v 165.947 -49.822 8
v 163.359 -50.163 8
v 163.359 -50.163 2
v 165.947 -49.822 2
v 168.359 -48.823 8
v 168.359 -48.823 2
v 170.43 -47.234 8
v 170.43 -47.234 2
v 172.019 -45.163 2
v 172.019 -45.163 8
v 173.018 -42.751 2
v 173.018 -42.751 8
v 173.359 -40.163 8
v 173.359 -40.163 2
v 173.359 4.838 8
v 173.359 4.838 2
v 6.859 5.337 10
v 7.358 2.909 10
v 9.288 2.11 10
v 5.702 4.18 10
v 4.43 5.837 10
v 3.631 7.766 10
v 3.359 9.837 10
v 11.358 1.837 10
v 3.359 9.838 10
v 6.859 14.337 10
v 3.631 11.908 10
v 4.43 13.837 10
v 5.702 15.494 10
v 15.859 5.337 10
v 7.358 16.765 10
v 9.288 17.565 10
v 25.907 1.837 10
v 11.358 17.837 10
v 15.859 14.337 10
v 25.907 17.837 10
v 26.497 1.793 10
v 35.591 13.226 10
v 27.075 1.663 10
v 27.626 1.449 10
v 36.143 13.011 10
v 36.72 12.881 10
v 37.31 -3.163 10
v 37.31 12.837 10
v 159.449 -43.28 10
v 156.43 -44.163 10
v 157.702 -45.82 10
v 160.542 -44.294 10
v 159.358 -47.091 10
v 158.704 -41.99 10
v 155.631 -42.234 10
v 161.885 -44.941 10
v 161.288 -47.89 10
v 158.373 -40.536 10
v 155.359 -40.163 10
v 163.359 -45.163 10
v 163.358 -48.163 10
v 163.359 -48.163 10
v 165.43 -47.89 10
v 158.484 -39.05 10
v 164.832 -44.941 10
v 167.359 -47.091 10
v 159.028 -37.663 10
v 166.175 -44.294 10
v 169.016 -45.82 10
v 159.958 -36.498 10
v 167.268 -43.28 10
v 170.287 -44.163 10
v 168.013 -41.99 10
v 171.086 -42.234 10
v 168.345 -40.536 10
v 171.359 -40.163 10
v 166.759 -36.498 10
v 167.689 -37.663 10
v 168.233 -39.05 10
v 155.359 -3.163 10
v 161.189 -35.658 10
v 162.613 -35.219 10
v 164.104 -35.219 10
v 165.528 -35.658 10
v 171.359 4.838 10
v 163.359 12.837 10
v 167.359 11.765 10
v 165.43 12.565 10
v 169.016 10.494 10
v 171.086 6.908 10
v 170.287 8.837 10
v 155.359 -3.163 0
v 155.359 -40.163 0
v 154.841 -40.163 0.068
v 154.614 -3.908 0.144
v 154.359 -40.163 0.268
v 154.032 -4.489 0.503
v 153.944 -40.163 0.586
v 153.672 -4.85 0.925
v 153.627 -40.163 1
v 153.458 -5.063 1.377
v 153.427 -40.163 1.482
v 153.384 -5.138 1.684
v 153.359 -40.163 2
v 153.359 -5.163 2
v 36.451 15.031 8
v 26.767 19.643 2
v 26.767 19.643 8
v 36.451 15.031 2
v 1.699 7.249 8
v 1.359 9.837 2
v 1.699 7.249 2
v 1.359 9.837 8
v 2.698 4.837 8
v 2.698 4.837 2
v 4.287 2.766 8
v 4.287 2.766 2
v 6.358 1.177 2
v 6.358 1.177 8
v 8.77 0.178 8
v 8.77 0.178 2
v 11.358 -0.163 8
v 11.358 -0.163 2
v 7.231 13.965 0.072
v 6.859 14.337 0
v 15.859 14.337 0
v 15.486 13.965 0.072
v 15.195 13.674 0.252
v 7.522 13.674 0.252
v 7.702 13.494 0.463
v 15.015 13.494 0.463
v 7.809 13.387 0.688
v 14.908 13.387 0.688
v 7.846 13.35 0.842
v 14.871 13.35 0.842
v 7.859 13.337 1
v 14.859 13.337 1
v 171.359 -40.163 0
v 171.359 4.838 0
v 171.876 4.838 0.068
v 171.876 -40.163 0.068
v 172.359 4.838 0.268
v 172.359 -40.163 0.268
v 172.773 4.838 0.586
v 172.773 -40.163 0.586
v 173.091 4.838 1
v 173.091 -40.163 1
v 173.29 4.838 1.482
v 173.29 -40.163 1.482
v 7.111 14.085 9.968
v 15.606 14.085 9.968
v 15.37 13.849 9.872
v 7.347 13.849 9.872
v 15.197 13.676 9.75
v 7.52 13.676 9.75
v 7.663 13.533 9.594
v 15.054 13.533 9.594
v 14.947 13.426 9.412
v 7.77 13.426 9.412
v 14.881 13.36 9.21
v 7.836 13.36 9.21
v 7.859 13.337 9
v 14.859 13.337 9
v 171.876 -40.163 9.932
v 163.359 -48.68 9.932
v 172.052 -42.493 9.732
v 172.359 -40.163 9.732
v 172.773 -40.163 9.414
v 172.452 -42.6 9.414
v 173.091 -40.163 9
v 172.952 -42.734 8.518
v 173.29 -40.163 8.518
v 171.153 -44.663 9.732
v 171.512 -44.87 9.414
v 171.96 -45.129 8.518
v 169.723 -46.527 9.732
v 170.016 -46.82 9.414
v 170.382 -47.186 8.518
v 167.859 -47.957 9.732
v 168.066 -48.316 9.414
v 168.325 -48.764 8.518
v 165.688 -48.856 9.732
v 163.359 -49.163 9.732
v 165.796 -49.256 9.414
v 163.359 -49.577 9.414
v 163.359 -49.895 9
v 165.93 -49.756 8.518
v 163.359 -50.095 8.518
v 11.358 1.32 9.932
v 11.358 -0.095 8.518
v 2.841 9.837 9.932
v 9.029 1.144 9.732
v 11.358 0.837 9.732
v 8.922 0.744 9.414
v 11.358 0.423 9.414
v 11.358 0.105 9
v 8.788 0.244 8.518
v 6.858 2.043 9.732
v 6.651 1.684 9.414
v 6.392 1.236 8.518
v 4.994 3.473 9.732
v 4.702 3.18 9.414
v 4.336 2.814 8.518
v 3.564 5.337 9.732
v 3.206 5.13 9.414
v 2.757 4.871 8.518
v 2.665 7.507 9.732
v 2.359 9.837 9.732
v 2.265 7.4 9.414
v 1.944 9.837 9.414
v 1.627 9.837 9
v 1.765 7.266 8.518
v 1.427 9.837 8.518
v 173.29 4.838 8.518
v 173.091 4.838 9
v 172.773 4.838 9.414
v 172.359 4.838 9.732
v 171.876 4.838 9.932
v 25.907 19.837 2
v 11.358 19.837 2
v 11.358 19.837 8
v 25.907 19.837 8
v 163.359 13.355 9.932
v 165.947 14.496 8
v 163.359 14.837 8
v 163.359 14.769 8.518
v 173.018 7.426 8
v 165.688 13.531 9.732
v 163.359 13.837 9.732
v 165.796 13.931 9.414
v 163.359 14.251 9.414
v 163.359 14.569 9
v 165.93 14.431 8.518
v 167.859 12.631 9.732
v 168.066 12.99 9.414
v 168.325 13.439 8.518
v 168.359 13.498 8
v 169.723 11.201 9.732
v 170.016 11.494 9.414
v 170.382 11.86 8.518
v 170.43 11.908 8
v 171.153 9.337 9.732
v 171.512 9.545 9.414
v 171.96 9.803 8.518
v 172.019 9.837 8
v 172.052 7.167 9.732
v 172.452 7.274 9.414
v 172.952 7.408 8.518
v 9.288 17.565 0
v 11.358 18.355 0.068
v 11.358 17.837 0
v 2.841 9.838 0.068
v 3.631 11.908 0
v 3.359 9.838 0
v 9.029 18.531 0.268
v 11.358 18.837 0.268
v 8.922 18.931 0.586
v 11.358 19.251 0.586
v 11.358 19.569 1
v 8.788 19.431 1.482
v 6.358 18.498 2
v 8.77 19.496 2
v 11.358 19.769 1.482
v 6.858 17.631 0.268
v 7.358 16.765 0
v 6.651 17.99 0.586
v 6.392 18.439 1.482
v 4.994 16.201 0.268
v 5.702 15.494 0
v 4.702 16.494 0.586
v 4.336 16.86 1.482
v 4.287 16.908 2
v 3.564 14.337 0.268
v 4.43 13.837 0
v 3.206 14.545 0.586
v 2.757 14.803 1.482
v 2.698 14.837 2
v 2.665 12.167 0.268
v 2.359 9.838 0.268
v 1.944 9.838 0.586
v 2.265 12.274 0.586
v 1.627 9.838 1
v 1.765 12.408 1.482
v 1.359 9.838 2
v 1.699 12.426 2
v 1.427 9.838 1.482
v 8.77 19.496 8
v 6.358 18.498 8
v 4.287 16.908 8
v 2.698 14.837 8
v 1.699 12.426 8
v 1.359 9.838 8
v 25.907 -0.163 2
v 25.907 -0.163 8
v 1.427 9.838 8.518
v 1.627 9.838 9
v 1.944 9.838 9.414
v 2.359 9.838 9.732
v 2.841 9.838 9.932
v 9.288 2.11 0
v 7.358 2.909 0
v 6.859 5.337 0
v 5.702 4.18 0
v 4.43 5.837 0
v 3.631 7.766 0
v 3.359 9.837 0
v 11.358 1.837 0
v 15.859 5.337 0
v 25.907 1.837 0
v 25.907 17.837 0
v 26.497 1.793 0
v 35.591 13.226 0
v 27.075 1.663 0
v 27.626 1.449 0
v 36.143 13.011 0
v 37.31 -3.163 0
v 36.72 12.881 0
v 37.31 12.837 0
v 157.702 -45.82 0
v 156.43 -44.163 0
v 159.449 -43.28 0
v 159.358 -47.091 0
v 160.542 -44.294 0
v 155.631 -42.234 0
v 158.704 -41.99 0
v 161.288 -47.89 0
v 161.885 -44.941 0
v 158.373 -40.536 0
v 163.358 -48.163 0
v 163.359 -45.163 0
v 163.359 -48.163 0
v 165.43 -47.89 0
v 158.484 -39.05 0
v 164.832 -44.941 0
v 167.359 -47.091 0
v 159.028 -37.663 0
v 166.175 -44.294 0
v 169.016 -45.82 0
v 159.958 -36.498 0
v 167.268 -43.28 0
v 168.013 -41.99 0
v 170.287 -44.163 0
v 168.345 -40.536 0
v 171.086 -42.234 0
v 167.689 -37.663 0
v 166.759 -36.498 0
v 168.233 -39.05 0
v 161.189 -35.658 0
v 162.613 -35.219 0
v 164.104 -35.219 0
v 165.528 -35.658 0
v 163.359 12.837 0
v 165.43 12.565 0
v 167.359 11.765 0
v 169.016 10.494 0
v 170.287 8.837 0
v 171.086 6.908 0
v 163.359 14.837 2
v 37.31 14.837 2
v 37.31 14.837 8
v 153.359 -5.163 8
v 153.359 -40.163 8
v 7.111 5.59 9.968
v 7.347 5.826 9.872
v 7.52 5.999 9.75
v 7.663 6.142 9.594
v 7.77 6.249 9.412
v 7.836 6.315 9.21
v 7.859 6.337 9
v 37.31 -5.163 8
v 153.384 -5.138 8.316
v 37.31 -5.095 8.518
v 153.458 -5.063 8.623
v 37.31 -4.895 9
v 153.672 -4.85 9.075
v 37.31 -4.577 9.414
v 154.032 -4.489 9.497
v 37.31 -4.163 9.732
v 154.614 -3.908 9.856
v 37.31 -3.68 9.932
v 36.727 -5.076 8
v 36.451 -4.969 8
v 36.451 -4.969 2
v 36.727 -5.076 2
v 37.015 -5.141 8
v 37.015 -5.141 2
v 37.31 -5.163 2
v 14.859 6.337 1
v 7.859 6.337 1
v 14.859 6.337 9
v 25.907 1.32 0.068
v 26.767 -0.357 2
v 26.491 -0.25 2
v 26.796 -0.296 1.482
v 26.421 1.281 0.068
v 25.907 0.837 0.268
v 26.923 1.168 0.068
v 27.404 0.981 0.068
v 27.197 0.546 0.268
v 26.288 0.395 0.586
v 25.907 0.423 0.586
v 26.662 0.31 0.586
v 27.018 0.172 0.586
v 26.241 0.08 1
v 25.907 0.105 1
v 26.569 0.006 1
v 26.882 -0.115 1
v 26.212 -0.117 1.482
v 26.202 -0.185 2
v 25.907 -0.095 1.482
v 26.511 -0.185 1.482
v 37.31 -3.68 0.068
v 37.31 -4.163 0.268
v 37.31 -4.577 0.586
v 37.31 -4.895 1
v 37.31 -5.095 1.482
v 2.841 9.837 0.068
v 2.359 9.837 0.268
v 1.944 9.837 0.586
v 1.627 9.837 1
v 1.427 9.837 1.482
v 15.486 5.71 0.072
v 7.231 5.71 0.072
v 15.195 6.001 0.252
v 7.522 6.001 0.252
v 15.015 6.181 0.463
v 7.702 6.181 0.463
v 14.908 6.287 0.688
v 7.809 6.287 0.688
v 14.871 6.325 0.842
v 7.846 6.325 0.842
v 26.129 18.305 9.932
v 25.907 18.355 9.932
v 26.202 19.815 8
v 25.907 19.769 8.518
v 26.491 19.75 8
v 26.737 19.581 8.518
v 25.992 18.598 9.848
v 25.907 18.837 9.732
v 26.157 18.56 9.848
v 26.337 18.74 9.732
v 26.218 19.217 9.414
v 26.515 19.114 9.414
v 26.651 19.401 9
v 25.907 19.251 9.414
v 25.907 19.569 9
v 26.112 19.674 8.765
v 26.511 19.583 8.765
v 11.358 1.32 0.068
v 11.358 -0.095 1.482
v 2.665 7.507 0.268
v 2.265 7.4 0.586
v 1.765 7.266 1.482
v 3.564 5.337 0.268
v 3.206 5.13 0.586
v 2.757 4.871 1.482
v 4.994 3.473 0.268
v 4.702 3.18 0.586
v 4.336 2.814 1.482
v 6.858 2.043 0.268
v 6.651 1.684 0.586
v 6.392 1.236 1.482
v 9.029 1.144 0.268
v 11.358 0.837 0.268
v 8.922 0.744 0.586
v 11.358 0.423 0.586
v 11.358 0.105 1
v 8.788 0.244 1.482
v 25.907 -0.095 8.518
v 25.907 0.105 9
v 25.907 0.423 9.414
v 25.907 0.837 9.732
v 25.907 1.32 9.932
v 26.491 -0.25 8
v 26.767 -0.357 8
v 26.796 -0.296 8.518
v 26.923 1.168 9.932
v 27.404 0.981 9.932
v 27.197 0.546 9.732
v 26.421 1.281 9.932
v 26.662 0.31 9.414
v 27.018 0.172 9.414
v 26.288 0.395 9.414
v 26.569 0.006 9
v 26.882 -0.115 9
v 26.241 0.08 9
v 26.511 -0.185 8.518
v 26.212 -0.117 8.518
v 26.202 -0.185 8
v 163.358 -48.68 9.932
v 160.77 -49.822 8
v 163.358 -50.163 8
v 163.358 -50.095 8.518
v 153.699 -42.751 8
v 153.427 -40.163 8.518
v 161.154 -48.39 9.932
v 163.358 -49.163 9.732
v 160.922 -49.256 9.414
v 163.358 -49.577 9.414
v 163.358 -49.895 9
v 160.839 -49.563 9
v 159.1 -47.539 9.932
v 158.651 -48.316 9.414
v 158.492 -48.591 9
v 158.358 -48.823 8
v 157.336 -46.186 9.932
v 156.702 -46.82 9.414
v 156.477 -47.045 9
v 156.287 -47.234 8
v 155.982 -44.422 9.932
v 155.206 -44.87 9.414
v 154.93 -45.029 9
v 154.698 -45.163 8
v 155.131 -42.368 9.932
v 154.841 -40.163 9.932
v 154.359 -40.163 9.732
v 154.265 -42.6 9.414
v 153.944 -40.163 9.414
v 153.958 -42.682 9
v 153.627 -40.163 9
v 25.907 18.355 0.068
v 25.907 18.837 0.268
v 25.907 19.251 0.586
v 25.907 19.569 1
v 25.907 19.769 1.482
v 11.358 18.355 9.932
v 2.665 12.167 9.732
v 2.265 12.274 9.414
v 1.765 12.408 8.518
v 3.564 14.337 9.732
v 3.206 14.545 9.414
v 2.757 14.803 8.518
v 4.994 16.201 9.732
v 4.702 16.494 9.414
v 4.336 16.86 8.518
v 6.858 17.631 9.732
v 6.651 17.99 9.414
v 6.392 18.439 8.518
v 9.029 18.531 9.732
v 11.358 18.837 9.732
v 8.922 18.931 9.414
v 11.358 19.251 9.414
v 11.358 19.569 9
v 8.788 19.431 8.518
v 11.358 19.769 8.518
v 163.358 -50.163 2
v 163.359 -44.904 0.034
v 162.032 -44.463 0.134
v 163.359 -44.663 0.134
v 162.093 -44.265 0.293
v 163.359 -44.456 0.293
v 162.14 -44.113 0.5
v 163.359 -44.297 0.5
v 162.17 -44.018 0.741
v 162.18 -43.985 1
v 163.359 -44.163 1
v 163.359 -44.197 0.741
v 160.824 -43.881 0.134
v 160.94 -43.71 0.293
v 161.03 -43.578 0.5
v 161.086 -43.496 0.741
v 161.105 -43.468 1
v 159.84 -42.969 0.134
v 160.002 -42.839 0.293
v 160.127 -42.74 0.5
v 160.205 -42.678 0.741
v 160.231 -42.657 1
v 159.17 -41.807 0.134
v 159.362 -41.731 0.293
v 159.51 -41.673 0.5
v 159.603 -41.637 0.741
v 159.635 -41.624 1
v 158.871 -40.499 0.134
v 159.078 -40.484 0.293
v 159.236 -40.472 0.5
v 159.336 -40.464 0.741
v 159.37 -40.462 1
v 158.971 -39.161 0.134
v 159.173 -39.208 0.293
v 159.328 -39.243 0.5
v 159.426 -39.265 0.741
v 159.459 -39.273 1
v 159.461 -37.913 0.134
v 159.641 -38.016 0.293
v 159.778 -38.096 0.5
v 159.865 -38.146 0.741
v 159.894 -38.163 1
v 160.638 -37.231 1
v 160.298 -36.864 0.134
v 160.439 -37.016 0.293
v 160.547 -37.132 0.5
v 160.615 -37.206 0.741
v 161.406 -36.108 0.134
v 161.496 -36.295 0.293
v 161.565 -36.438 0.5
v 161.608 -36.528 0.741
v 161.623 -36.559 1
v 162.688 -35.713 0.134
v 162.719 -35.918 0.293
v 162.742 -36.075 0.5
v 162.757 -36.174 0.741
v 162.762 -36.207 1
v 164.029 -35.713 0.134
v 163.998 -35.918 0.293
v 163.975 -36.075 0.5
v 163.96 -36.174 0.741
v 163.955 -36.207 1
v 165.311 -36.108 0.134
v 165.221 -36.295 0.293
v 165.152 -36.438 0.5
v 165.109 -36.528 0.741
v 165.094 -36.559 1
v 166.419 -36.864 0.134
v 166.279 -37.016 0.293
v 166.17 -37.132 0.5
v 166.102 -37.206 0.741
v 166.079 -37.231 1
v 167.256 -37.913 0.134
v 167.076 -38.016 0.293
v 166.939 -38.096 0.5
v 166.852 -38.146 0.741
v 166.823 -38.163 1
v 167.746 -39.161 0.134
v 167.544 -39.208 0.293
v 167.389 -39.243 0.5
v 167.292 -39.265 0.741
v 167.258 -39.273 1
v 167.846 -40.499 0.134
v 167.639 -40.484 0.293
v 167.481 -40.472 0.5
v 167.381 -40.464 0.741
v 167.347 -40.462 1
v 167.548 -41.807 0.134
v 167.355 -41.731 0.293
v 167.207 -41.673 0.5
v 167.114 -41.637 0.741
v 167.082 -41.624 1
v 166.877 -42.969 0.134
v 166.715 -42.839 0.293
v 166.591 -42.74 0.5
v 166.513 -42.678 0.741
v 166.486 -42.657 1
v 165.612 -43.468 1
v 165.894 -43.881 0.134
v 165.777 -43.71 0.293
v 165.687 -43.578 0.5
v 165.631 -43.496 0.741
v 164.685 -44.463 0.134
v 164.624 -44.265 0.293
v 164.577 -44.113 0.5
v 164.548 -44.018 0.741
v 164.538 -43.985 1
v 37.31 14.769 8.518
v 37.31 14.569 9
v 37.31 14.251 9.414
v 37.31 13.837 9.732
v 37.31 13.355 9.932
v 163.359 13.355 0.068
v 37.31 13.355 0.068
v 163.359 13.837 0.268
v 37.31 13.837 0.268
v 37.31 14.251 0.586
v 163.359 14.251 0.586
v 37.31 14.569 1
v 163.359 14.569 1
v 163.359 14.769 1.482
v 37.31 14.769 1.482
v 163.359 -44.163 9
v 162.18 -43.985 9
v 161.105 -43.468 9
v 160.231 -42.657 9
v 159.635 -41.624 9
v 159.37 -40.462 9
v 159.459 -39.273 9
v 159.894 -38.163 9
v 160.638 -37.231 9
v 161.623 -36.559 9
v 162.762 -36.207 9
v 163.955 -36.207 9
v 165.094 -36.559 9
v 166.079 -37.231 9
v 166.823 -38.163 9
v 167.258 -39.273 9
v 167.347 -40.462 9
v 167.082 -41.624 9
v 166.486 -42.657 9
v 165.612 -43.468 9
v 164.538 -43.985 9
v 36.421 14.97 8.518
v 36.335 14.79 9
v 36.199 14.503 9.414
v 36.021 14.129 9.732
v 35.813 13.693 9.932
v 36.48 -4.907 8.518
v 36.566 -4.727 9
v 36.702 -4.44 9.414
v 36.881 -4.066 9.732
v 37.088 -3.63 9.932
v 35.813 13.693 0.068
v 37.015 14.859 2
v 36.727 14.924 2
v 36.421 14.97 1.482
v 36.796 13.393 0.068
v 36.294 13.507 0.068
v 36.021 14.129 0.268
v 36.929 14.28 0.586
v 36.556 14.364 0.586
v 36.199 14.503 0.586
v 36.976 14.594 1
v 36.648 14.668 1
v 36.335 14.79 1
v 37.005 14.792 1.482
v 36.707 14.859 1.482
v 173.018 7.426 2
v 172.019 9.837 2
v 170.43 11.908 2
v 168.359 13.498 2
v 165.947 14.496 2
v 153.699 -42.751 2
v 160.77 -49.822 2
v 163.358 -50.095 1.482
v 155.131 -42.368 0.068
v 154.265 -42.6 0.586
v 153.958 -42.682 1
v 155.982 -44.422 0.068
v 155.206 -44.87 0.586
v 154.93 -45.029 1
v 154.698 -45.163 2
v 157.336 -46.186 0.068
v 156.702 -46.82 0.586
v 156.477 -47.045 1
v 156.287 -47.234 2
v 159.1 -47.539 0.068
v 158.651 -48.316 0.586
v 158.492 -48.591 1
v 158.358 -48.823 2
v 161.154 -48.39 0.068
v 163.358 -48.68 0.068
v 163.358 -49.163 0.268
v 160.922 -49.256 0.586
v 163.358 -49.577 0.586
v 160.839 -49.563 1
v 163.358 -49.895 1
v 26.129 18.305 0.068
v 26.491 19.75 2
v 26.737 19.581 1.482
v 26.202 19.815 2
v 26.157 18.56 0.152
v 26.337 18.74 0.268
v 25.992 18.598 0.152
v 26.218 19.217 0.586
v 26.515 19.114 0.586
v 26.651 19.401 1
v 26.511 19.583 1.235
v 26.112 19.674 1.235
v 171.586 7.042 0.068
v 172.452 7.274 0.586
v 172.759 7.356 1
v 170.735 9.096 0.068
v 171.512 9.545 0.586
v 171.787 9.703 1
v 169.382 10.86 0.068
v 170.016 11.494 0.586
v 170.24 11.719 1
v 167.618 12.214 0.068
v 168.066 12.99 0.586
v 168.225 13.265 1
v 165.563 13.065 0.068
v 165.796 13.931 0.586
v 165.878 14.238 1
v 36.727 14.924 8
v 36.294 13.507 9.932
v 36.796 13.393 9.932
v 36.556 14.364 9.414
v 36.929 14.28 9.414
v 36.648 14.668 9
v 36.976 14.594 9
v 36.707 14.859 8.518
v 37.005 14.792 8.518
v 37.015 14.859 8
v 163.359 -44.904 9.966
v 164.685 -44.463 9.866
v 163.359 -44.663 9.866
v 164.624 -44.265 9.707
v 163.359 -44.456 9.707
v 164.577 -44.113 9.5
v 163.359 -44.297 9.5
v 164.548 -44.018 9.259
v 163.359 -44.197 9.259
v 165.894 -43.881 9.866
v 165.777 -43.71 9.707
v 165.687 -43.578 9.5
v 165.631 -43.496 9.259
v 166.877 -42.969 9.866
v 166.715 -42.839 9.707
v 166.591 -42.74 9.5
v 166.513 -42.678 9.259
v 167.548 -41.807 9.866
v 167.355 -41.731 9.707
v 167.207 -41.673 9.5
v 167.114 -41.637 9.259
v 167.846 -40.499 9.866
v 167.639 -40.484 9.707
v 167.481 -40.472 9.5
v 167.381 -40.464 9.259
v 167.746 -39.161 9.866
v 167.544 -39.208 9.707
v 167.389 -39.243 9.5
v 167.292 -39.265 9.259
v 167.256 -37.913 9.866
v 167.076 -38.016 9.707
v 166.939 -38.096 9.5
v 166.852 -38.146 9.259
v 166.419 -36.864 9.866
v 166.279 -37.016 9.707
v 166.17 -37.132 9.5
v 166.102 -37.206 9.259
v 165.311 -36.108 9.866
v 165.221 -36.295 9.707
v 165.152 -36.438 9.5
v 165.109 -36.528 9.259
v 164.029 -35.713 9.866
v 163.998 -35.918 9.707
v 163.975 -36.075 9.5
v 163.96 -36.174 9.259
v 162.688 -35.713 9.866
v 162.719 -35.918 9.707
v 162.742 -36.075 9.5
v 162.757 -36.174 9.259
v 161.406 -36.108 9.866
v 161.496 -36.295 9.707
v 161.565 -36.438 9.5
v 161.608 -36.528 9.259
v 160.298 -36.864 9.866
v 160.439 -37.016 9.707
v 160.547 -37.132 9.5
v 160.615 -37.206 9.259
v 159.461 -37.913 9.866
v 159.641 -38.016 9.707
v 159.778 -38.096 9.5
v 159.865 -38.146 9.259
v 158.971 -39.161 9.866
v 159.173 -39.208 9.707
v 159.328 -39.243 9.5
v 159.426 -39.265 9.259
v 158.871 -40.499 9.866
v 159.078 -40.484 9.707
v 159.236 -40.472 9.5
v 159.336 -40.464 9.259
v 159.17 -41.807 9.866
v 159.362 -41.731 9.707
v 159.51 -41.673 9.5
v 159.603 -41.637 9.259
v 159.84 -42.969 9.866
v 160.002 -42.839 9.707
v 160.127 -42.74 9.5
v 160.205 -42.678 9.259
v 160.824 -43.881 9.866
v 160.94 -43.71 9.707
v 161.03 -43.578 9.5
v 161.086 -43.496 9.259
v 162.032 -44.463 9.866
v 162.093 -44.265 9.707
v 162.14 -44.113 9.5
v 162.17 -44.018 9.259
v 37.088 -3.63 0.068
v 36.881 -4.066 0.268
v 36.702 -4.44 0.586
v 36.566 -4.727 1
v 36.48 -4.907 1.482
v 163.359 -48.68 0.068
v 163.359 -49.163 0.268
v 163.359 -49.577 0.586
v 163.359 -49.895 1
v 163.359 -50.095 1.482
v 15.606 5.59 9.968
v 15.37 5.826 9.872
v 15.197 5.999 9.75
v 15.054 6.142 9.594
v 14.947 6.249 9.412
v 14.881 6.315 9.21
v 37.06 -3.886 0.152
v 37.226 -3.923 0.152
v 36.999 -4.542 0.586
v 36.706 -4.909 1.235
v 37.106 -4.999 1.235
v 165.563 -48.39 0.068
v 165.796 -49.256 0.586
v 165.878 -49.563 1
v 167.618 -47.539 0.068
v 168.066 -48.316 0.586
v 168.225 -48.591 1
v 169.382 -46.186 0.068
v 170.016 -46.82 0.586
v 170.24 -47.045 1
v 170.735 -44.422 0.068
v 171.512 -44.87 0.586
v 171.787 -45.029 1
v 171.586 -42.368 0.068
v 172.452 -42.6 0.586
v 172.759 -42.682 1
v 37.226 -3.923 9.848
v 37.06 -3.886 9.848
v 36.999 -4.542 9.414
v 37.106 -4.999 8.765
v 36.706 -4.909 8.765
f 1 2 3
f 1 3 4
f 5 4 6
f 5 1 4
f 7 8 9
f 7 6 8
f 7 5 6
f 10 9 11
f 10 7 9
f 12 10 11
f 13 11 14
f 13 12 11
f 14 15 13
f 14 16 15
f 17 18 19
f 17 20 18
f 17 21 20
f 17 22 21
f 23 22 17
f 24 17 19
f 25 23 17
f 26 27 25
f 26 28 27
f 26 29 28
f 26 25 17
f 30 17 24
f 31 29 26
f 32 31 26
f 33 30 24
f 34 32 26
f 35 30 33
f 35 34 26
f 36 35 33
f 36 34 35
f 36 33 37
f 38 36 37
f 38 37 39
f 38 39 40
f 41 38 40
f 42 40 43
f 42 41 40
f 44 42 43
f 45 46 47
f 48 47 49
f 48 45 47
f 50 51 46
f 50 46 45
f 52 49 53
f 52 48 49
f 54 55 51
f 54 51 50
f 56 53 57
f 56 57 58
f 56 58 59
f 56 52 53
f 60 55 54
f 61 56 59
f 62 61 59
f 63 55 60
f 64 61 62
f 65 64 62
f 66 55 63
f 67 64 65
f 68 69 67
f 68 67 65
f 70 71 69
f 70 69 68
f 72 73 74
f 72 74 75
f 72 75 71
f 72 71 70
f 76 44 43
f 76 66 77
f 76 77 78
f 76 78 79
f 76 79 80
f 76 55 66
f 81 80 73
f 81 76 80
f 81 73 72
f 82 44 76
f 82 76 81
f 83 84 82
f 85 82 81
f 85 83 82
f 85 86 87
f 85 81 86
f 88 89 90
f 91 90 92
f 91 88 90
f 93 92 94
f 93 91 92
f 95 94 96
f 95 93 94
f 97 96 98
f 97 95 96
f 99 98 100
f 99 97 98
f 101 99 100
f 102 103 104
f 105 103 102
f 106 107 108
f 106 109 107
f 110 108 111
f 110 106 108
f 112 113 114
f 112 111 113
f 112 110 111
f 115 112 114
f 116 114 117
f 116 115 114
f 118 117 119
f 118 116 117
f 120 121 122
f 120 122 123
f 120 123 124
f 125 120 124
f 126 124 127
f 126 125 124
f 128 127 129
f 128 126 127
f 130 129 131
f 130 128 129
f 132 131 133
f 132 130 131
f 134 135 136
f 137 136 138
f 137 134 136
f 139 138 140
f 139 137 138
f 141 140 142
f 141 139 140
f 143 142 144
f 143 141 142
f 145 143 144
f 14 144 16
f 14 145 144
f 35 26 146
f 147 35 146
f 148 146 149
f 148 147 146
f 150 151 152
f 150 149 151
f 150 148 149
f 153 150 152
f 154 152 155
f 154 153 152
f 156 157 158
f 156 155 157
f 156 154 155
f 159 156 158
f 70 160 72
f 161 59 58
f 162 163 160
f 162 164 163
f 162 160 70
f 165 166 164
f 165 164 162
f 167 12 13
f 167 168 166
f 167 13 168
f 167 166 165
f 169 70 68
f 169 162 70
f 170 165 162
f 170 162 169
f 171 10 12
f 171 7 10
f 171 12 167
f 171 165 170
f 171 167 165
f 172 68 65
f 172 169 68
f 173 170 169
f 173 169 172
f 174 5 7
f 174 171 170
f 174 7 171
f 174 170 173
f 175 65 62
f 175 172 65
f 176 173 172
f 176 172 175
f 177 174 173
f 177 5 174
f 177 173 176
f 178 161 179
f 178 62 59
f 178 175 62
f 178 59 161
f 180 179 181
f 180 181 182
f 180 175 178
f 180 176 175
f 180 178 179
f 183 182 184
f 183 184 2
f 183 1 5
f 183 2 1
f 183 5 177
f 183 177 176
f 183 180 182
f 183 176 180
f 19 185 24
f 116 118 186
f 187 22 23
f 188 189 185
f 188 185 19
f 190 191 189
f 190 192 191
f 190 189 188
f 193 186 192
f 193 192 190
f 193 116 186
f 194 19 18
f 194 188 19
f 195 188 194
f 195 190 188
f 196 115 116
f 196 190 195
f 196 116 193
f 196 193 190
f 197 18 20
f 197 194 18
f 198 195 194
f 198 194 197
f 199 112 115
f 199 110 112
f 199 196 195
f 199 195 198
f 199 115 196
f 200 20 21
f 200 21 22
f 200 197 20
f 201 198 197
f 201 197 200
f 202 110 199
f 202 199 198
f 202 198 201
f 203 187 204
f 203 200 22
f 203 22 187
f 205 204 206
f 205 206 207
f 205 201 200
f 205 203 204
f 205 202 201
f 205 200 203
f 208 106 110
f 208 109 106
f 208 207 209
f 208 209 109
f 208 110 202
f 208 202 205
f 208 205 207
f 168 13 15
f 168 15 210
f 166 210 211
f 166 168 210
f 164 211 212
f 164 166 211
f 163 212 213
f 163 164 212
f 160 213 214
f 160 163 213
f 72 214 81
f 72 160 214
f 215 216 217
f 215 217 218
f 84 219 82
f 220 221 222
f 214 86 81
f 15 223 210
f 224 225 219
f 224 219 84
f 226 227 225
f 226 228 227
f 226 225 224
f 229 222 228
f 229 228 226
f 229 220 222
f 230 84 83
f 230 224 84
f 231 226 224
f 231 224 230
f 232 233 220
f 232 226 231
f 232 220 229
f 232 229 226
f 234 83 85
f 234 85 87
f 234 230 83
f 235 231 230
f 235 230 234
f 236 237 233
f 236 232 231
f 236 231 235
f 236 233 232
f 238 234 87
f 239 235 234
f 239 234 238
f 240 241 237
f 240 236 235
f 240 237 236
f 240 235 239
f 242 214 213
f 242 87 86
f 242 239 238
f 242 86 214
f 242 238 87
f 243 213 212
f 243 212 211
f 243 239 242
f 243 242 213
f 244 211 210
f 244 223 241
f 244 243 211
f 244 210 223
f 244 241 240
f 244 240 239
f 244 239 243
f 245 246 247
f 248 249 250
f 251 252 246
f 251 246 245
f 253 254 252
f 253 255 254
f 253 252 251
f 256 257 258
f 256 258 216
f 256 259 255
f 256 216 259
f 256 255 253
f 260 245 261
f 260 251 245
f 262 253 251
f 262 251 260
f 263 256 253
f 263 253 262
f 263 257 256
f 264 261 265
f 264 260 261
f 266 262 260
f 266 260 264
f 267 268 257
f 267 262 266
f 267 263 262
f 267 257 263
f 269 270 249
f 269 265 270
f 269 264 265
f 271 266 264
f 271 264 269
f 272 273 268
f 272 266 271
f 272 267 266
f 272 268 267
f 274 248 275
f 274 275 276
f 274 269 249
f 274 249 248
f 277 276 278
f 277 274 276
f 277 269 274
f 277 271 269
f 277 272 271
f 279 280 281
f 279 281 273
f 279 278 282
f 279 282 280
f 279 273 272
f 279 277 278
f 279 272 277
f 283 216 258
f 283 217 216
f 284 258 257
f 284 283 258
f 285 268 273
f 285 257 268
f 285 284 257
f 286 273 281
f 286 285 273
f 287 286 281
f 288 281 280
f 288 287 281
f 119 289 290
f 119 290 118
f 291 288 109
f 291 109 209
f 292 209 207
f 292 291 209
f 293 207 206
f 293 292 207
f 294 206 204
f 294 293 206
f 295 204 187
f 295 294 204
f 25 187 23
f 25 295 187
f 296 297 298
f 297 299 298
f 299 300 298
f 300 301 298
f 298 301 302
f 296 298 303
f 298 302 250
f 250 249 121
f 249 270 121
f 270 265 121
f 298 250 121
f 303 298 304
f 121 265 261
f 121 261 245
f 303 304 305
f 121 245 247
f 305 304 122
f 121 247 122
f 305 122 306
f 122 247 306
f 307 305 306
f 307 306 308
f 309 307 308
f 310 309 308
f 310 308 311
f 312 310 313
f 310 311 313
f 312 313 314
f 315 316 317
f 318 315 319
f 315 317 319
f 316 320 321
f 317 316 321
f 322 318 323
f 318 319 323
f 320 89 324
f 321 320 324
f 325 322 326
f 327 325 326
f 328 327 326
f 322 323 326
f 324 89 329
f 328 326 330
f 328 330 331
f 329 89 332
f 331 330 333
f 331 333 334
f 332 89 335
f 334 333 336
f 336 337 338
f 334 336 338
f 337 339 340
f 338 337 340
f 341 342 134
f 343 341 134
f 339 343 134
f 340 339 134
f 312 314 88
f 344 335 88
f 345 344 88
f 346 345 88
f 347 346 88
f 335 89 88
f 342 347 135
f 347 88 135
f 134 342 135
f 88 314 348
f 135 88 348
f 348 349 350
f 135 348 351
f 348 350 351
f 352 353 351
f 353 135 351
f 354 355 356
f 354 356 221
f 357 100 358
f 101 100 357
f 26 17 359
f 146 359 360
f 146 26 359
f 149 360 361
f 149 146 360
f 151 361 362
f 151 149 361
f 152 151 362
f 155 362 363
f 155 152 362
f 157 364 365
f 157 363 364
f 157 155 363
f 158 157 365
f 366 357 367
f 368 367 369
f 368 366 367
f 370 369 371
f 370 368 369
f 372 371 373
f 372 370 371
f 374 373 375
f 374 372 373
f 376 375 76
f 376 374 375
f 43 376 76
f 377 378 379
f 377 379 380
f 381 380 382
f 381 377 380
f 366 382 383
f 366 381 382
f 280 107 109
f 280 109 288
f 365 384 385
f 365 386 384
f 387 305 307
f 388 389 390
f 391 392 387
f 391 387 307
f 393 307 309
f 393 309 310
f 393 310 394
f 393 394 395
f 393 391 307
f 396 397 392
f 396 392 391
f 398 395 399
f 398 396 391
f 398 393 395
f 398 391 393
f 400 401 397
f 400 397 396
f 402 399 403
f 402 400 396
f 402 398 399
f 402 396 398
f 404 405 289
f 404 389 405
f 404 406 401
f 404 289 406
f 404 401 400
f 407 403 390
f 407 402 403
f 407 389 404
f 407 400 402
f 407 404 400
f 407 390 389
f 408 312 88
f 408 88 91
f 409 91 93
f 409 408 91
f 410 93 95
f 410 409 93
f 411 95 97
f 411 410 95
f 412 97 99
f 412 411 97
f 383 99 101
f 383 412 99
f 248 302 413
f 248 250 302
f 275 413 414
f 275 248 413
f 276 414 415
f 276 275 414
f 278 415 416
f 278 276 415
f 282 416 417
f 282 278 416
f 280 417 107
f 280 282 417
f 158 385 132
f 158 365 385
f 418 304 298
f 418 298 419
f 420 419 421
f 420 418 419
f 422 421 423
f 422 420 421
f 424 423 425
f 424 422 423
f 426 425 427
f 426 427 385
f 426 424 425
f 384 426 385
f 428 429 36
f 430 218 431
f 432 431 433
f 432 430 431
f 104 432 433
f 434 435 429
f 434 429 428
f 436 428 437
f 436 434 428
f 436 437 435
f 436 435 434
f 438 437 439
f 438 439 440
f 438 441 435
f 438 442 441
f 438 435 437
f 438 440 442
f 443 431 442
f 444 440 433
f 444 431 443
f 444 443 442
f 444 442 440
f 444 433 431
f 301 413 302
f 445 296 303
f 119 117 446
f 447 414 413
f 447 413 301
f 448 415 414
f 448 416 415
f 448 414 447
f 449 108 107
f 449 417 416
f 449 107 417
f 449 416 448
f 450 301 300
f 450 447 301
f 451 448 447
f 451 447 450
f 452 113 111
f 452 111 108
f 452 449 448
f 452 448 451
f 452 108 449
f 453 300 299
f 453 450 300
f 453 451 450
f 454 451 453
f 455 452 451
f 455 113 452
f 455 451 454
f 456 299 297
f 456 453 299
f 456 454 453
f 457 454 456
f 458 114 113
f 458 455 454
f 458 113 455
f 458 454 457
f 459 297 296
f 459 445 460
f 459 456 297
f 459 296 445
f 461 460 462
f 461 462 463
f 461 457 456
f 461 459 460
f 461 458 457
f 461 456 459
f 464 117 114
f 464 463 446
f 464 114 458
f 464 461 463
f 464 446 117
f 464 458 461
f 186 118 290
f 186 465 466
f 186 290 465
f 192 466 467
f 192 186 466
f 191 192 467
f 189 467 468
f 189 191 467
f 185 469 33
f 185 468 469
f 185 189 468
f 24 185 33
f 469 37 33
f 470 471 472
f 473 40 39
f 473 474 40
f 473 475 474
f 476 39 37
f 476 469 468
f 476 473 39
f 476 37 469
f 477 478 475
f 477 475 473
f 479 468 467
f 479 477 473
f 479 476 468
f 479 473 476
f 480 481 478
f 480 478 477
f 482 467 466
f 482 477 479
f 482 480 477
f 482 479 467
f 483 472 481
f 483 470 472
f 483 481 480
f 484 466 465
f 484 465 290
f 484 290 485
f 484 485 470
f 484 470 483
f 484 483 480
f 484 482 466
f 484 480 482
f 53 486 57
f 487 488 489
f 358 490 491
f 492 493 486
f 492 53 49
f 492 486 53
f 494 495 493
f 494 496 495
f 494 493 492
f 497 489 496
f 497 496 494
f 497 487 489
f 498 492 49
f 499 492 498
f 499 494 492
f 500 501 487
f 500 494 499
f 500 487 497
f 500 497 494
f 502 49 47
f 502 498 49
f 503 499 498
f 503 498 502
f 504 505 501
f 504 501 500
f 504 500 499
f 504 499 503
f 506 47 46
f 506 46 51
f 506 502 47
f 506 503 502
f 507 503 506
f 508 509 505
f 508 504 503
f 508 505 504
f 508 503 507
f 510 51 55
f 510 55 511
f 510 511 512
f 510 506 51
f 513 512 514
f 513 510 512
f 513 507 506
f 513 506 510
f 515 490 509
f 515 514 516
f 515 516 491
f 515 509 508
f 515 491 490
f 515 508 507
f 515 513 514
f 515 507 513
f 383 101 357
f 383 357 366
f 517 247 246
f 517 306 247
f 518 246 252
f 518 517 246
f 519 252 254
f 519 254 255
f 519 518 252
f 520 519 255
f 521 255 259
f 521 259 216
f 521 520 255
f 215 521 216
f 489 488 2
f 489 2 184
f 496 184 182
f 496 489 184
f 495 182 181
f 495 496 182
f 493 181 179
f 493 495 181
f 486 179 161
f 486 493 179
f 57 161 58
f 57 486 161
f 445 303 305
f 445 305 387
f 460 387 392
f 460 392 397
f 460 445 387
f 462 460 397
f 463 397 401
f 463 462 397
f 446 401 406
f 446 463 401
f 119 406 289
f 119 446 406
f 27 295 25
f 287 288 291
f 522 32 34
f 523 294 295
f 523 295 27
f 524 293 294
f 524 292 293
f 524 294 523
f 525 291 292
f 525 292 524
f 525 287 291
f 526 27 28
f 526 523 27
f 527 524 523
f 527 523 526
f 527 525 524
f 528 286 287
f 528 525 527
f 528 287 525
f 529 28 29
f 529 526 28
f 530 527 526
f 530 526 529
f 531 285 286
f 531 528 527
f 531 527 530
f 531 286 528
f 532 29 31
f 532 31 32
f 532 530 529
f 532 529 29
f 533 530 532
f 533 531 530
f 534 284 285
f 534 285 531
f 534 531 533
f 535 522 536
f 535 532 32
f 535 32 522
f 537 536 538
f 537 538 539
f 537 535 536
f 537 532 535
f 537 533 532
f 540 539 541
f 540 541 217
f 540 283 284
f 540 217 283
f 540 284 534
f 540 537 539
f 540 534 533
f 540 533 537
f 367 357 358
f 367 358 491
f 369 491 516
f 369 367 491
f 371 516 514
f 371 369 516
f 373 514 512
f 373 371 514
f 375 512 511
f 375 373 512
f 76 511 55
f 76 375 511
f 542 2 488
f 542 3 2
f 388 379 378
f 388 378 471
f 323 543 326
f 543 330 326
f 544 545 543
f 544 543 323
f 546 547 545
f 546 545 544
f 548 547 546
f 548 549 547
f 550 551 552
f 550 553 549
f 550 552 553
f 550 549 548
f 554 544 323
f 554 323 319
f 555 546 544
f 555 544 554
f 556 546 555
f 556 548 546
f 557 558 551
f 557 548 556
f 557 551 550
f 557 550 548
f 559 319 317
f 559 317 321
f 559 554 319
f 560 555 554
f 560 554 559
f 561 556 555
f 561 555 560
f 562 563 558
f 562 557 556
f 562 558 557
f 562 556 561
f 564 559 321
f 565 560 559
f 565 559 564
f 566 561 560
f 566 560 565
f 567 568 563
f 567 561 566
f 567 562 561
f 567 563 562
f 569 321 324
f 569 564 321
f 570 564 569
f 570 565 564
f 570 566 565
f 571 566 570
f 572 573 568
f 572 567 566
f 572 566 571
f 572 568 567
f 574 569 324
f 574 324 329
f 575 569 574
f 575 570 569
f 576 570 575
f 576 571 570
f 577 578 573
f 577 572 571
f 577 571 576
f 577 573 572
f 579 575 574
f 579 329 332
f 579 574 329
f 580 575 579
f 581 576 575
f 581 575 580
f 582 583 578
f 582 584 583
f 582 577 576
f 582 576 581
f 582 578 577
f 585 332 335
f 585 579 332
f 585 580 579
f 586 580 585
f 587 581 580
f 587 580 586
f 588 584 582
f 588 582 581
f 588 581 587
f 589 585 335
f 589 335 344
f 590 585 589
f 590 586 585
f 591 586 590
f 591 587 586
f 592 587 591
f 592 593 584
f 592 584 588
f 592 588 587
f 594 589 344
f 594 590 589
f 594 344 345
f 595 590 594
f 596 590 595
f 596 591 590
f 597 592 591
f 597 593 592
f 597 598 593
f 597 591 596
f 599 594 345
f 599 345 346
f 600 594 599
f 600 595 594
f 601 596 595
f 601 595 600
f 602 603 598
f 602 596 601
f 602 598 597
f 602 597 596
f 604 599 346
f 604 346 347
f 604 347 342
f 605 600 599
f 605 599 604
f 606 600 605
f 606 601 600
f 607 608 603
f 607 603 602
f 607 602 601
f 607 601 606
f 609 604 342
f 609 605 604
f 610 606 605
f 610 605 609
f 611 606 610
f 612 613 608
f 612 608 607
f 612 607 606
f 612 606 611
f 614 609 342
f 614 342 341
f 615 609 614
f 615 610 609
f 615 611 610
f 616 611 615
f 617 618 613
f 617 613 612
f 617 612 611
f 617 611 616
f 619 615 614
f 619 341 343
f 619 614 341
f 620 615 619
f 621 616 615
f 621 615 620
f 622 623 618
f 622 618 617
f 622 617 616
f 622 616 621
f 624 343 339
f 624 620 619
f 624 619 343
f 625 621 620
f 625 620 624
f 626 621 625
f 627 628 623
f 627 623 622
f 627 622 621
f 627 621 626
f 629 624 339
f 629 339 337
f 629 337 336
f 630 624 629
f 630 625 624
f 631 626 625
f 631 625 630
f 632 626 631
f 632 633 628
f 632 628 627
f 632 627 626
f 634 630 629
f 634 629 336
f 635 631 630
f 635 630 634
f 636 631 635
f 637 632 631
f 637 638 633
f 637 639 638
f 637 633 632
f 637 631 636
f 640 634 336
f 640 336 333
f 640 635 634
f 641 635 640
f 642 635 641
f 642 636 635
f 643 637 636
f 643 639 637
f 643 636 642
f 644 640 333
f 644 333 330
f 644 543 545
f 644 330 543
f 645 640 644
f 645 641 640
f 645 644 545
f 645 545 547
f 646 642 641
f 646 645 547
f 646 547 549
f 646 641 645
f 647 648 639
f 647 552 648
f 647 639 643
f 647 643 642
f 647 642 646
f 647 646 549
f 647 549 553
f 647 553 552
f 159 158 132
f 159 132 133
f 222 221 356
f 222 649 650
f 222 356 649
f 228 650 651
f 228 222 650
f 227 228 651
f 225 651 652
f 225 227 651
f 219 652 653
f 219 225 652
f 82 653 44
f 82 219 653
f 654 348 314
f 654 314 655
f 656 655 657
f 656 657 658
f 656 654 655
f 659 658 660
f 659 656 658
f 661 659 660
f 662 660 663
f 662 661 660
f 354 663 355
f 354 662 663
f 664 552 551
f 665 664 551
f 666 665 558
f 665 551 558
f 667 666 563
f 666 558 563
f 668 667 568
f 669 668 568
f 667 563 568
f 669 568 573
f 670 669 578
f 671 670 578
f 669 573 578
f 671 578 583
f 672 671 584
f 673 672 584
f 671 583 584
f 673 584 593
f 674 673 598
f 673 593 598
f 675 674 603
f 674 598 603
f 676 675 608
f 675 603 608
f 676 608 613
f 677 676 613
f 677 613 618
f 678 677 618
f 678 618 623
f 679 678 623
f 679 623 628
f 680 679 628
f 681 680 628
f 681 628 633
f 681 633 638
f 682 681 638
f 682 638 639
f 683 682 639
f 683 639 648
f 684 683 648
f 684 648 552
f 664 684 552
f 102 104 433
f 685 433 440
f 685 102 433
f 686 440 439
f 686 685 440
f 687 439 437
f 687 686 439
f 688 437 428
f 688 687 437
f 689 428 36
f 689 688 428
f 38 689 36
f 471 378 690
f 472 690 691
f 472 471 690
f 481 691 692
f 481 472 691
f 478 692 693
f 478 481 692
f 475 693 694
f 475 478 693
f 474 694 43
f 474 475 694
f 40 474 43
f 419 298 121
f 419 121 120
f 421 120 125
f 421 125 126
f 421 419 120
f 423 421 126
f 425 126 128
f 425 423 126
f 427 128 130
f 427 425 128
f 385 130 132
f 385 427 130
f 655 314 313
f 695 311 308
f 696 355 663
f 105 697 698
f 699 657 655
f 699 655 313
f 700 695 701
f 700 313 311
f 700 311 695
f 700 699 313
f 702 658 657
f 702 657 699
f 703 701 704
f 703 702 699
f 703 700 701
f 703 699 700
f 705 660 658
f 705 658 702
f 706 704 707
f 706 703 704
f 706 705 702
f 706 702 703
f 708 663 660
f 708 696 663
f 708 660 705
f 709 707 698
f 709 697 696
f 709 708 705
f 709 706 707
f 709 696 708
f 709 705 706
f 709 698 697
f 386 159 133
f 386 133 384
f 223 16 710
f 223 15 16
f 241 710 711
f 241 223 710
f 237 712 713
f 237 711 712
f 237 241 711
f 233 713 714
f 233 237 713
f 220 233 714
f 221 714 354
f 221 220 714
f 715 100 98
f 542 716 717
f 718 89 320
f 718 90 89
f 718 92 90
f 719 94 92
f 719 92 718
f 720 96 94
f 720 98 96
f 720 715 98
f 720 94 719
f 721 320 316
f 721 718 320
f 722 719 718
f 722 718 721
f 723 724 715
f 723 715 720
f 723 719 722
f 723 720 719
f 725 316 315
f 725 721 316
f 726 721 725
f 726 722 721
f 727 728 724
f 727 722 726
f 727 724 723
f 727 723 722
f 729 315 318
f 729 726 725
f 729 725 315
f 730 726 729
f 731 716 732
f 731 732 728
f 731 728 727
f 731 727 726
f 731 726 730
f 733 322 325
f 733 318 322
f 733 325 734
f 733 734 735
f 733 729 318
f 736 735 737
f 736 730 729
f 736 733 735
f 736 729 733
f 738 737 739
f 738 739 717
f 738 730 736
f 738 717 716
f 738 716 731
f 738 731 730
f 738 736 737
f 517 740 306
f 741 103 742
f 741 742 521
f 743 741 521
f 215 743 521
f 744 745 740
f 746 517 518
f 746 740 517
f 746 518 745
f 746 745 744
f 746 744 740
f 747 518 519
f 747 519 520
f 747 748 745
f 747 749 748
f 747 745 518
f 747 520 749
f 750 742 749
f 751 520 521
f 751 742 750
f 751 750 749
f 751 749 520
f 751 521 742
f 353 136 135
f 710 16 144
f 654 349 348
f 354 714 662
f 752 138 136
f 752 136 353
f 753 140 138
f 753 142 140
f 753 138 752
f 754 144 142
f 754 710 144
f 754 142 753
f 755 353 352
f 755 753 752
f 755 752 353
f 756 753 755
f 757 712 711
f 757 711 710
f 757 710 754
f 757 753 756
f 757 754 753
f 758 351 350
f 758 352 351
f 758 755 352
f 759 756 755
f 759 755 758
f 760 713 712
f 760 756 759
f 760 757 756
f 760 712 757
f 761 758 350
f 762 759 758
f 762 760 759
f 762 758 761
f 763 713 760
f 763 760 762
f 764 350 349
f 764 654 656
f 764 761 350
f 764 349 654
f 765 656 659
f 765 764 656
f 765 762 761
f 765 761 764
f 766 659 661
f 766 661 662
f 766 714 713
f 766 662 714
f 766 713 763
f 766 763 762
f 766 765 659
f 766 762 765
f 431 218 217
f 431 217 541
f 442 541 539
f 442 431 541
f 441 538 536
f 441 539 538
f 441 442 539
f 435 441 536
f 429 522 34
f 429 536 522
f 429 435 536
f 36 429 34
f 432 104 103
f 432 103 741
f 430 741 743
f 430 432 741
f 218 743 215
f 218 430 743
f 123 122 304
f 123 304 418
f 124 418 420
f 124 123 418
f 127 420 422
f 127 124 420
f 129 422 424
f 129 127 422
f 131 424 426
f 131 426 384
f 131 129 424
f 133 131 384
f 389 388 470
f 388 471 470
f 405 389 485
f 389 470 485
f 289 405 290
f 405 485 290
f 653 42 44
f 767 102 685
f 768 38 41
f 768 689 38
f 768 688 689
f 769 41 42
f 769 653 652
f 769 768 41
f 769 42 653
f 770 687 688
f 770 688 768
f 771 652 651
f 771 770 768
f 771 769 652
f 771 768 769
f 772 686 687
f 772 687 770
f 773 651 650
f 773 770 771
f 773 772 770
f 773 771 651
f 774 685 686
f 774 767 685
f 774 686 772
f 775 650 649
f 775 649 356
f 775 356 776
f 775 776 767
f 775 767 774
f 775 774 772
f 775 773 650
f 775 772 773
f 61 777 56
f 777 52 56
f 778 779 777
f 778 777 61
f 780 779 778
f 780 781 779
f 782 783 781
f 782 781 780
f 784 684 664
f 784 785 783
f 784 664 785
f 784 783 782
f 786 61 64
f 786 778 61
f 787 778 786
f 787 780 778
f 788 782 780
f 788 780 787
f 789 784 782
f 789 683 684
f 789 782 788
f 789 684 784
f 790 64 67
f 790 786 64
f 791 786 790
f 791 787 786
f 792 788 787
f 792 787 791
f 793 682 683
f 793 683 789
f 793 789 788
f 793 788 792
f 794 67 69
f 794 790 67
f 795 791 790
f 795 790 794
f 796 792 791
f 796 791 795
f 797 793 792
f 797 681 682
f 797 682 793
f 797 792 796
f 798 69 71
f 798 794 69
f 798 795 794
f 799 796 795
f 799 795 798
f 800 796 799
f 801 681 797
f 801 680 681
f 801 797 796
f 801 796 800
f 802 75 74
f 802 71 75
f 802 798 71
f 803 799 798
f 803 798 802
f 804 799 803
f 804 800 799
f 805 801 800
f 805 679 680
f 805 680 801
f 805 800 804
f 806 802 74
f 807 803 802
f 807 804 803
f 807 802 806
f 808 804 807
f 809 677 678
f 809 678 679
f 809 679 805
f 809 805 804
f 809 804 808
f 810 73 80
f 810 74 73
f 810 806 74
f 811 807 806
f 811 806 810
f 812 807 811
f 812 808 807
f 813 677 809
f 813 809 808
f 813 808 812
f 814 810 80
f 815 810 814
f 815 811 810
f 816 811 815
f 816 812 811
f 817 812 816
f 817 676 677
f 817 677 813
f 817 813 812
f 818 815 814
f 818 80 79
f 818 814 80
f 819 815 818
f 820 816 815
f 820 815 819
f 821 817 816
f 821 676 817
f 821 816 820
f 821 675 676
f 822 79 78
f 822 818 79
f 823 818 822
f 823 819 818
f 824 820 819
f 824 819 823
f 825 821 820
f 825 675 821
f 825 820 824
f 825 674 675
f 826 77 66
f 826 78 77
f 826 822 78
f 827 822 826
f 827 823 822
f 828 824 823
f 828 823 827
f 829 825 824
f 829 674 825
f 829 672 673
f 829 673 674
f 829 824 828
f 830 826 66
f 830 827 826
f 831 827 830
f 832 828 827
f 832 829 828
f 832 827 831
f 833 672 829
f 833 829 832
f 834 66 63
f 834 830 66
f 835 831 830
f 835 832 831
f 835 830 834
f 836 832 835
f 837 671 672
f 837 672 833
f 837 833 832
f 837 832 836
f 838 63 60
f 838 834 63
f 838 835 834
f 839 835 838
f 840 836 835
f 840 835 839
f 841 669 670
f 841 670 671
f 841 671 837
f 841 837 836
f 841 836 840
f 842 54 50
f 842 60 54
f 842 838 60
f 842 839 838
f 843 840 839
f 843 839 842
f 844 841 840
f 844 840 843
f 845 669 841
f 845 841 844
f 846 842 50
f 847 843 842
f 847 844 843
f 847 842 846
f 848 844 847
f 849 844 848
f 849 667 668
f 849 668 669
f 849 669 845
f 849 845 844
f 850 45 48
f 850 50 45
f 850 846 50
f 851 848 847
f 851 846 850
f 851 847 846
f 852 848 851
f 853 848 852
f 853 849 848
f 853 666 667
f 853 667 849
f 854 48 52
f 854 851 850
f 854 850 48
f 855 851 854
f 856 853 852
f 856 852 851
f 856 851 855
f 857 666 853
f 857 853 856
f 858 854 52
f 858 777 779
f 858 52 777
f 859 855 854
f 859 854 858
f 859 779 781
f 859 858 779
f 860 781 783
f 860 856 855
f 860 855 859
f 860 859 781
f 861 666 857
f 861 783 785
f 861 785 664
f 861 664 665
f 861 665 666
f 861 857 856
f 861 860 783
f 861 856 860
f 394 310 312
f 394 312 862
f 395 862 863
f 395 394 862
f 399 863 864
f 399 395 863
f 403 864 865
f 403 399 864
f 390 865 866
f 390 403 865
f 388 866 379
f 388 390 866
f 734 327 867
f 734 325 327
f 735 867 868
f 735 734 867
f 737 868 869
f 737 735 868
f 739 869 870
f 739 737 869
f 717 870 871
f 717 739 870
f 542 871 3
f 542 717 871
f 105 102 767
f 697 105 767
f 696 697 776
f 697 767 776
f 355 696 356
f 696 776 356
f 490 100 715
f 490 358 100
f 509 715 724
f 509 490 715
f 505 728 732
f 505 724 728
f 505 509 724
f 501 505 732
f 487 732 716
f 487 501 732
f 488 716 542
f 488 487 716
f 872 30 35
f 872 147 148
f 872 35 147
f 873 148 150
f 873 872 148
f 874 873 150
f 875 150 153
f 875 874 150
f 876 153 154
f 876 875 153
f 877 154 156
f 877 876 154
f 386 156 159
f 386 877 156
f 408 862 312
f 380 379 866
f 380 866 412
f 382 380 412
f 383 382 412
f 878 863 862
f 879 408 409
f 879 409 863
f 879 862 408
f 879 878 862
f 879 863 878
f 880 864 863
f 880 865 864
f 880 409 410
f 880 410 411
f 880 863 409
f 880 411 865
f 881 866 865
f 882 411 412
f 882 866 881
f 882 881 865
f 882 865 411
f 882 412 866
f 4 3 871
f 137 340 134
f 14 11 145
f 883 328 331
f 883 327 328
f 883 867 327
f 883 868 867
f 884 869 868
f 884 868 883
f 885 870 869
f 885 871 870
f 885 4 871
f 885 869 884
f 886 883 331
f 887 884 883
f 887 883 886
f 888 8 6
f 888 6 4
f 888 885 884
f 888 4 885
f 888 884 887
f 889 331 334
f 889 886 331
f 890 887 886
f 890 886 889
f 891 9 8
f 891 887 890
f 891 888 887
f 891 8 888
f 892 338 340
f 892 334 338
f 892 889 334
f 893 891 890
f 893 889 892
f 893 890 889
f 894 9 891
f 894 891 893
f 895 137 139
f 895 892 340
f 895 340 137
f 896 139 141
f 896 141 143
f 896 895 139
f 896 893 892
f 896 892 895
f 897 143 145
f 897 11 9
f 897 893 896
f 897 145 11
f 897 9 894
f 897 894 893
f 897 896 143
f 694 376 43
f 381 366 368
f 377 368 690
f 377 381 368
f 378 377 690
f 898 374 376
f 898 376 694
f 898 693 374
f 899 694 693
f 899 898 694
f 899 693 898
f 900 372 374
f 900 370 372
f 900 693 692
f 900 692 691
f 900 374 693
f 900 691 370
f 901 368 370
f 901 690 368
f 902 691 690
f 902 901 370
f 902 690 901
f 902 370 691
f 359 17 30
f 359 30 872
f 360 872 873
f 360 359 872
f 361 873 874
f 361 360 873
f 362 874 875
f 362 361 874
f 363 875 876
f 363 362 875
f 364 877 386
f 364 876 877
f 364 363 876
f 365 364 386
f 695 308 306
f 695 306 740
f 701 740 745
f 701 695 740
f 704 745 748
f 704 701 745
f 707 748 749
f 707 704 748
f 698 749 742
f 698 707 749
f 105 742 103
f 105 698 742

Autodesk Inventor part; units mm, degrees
ref_plane "YZ Plane" through (0, 0, 0) normal (1, 0, 0) x (0, 1, 0)
ref_plane "XZ Plane" through (0, 0, 0) normal (0, 1, 0) x (-1, 0, 0)
ref_plane "XY Plane" through (0, 0, 0) normal (0, 0, 1) x (1, 0, 0)
sketch "Sketch4" plane through (0, 0, 0) normal (0, 0, 1) x (1, 0, 0)
  line L0 (1.3586, -0.1628) -> (1.3586, 19.8372)
  line L1 (1.3586, 19.8372) -> (26.3586, 19.8372)
  line L2 (26.3586, 19.8372) -> (36.8586, 14.8372)
  line L3 (36.8586, 14.8372) -> (173.3586, 14.8372)
  line L4 (173.3586, 14.8372) -> (173.3586, -50.1628)
  line L5 (173.3586, -50.1628) -> (153.3586, -50.1628)
  line L6 (153.3586, -50.1628) -> (153.3586, -5.1628)
  line L7 (153.3586, -5.1628) -> (36.8586, -5.1628)
  line L8 (36.8586, -5.1628) -> (26.3586, -0.1628)
  line L9 (26.3586, -0.1628) -> (1.3586, -0.1628)
  dimension "d55" = 20
  dimension "d56" = 25
  dimension "d57" = 5
  dimension "d58" = 20
  dimension "d59" = 45
  dimension "d60" = 152
  dimension "d61" = 10.5
extrude "Arm Base" add sketch "Sketch4" along normal blind 10
sketch "Sketch5" plane through (0, 0, 10) normal (0, 0, 1) x (1, 0, 0)
  line L0 (153.3586, -50.1628) -> (173.3586, -50.1628) projected
  line L1 (153.3586, -5.1628) -> (153.3586, -50.1628) projected
  point P0 (163.3586, -40.1628)
  dimension "d62" = 10
  dimension "d63" = 10
hole "Pivot Holes" at (163.3586, -40.1628, 10) direction (0, 0, -1) diameter 8 end through all
sketch "Sketch6" plane through (0, 0, 10) normal (0, 0, 1) x (1, 0, 0)
  line L0 (7.8586, 13.3372) -> (14.8586, 13.3372)
  line L1 (14.8586, 13.3372) -> (14.8586, 6.3372)
  line L2 (14.8586, 6.3372) -> (7.8586, 6.3372)
  line L3 (7.8586, 6.3372) -> (7.8586, 13.3372)
  line L4 (1.3586, 19.8372) -> (1.3586, -0.1628) projected
  point P0 (0, 0)
  point P1 (7.8586, 9.8372)
  point P2 (1.3586, 9.8372)
  dimension "d48" = 7
  dimension "d64" = 6.5
extrude "Extrusion5" cut sketch "Sketch6" against normal up to next
fillet "Fillet2" radius 10 5 edges at (1.3586, -0.1628, 5) (1.3586, 19.8372, 5) (173.3586, -50.1628, 5) (153.3586, -50.1628, 5) (173.3586, 14.8372, 5)
fillet "Fillet3" radius 2 26 edges at (170.4298, 11.9084, 10) (173.3586, -17.6628, 10) (170.4298, -47.234, 10) (153.3586, -22.6631, 10) (100.1089, 14.8372, 10) (95.1086, -5.1628, 10) (170.4298, -47.234, 0) (153.3586, -22.6631, 0) (170.4298, 11.9084, 0) (100.1089, 14.8372, 0) (173.3586, -17.6628, 0) (95.1086, -5.1628, 0) (18.8584, -0.1628, 0) (18.8584, 19.8372, 0) (4.2874, 2.766, 0) (18.8584, 19.8372, 10) (18.8584, -0.1628, 10) (4.2874, 2.766, 10) (31.6086, 17.3372, 10) (31.6086, -2.6628, 10) (31.6086, -2.6628, 0) (31.6086, 17.3372, 0) (26.3586, 19.8372, 5) (36.8586, 14.8372, 5) (26.3586, -0.1628, 5) (36.8586, -5.1628, 5)
fillet "Fillet4" radius 1 2 edges at (163.3586, -36.1628, 10) (163.3586, -36.1628, 0)
fillet "Fillet5" radius 1 8 edges at (7.8586, 9.8372, 10) (11.3586, 13.3372, 10) (14.8586, 9.8372, 10) (11.3586, 6.3372, 10) (7.8586, 9.8372, 0) (11.3586, 6.3372, 0) (14.8586, 9.8372, 0) (11.3586, 13.3372, 0)
properties part number "Lift Arm Lower"
